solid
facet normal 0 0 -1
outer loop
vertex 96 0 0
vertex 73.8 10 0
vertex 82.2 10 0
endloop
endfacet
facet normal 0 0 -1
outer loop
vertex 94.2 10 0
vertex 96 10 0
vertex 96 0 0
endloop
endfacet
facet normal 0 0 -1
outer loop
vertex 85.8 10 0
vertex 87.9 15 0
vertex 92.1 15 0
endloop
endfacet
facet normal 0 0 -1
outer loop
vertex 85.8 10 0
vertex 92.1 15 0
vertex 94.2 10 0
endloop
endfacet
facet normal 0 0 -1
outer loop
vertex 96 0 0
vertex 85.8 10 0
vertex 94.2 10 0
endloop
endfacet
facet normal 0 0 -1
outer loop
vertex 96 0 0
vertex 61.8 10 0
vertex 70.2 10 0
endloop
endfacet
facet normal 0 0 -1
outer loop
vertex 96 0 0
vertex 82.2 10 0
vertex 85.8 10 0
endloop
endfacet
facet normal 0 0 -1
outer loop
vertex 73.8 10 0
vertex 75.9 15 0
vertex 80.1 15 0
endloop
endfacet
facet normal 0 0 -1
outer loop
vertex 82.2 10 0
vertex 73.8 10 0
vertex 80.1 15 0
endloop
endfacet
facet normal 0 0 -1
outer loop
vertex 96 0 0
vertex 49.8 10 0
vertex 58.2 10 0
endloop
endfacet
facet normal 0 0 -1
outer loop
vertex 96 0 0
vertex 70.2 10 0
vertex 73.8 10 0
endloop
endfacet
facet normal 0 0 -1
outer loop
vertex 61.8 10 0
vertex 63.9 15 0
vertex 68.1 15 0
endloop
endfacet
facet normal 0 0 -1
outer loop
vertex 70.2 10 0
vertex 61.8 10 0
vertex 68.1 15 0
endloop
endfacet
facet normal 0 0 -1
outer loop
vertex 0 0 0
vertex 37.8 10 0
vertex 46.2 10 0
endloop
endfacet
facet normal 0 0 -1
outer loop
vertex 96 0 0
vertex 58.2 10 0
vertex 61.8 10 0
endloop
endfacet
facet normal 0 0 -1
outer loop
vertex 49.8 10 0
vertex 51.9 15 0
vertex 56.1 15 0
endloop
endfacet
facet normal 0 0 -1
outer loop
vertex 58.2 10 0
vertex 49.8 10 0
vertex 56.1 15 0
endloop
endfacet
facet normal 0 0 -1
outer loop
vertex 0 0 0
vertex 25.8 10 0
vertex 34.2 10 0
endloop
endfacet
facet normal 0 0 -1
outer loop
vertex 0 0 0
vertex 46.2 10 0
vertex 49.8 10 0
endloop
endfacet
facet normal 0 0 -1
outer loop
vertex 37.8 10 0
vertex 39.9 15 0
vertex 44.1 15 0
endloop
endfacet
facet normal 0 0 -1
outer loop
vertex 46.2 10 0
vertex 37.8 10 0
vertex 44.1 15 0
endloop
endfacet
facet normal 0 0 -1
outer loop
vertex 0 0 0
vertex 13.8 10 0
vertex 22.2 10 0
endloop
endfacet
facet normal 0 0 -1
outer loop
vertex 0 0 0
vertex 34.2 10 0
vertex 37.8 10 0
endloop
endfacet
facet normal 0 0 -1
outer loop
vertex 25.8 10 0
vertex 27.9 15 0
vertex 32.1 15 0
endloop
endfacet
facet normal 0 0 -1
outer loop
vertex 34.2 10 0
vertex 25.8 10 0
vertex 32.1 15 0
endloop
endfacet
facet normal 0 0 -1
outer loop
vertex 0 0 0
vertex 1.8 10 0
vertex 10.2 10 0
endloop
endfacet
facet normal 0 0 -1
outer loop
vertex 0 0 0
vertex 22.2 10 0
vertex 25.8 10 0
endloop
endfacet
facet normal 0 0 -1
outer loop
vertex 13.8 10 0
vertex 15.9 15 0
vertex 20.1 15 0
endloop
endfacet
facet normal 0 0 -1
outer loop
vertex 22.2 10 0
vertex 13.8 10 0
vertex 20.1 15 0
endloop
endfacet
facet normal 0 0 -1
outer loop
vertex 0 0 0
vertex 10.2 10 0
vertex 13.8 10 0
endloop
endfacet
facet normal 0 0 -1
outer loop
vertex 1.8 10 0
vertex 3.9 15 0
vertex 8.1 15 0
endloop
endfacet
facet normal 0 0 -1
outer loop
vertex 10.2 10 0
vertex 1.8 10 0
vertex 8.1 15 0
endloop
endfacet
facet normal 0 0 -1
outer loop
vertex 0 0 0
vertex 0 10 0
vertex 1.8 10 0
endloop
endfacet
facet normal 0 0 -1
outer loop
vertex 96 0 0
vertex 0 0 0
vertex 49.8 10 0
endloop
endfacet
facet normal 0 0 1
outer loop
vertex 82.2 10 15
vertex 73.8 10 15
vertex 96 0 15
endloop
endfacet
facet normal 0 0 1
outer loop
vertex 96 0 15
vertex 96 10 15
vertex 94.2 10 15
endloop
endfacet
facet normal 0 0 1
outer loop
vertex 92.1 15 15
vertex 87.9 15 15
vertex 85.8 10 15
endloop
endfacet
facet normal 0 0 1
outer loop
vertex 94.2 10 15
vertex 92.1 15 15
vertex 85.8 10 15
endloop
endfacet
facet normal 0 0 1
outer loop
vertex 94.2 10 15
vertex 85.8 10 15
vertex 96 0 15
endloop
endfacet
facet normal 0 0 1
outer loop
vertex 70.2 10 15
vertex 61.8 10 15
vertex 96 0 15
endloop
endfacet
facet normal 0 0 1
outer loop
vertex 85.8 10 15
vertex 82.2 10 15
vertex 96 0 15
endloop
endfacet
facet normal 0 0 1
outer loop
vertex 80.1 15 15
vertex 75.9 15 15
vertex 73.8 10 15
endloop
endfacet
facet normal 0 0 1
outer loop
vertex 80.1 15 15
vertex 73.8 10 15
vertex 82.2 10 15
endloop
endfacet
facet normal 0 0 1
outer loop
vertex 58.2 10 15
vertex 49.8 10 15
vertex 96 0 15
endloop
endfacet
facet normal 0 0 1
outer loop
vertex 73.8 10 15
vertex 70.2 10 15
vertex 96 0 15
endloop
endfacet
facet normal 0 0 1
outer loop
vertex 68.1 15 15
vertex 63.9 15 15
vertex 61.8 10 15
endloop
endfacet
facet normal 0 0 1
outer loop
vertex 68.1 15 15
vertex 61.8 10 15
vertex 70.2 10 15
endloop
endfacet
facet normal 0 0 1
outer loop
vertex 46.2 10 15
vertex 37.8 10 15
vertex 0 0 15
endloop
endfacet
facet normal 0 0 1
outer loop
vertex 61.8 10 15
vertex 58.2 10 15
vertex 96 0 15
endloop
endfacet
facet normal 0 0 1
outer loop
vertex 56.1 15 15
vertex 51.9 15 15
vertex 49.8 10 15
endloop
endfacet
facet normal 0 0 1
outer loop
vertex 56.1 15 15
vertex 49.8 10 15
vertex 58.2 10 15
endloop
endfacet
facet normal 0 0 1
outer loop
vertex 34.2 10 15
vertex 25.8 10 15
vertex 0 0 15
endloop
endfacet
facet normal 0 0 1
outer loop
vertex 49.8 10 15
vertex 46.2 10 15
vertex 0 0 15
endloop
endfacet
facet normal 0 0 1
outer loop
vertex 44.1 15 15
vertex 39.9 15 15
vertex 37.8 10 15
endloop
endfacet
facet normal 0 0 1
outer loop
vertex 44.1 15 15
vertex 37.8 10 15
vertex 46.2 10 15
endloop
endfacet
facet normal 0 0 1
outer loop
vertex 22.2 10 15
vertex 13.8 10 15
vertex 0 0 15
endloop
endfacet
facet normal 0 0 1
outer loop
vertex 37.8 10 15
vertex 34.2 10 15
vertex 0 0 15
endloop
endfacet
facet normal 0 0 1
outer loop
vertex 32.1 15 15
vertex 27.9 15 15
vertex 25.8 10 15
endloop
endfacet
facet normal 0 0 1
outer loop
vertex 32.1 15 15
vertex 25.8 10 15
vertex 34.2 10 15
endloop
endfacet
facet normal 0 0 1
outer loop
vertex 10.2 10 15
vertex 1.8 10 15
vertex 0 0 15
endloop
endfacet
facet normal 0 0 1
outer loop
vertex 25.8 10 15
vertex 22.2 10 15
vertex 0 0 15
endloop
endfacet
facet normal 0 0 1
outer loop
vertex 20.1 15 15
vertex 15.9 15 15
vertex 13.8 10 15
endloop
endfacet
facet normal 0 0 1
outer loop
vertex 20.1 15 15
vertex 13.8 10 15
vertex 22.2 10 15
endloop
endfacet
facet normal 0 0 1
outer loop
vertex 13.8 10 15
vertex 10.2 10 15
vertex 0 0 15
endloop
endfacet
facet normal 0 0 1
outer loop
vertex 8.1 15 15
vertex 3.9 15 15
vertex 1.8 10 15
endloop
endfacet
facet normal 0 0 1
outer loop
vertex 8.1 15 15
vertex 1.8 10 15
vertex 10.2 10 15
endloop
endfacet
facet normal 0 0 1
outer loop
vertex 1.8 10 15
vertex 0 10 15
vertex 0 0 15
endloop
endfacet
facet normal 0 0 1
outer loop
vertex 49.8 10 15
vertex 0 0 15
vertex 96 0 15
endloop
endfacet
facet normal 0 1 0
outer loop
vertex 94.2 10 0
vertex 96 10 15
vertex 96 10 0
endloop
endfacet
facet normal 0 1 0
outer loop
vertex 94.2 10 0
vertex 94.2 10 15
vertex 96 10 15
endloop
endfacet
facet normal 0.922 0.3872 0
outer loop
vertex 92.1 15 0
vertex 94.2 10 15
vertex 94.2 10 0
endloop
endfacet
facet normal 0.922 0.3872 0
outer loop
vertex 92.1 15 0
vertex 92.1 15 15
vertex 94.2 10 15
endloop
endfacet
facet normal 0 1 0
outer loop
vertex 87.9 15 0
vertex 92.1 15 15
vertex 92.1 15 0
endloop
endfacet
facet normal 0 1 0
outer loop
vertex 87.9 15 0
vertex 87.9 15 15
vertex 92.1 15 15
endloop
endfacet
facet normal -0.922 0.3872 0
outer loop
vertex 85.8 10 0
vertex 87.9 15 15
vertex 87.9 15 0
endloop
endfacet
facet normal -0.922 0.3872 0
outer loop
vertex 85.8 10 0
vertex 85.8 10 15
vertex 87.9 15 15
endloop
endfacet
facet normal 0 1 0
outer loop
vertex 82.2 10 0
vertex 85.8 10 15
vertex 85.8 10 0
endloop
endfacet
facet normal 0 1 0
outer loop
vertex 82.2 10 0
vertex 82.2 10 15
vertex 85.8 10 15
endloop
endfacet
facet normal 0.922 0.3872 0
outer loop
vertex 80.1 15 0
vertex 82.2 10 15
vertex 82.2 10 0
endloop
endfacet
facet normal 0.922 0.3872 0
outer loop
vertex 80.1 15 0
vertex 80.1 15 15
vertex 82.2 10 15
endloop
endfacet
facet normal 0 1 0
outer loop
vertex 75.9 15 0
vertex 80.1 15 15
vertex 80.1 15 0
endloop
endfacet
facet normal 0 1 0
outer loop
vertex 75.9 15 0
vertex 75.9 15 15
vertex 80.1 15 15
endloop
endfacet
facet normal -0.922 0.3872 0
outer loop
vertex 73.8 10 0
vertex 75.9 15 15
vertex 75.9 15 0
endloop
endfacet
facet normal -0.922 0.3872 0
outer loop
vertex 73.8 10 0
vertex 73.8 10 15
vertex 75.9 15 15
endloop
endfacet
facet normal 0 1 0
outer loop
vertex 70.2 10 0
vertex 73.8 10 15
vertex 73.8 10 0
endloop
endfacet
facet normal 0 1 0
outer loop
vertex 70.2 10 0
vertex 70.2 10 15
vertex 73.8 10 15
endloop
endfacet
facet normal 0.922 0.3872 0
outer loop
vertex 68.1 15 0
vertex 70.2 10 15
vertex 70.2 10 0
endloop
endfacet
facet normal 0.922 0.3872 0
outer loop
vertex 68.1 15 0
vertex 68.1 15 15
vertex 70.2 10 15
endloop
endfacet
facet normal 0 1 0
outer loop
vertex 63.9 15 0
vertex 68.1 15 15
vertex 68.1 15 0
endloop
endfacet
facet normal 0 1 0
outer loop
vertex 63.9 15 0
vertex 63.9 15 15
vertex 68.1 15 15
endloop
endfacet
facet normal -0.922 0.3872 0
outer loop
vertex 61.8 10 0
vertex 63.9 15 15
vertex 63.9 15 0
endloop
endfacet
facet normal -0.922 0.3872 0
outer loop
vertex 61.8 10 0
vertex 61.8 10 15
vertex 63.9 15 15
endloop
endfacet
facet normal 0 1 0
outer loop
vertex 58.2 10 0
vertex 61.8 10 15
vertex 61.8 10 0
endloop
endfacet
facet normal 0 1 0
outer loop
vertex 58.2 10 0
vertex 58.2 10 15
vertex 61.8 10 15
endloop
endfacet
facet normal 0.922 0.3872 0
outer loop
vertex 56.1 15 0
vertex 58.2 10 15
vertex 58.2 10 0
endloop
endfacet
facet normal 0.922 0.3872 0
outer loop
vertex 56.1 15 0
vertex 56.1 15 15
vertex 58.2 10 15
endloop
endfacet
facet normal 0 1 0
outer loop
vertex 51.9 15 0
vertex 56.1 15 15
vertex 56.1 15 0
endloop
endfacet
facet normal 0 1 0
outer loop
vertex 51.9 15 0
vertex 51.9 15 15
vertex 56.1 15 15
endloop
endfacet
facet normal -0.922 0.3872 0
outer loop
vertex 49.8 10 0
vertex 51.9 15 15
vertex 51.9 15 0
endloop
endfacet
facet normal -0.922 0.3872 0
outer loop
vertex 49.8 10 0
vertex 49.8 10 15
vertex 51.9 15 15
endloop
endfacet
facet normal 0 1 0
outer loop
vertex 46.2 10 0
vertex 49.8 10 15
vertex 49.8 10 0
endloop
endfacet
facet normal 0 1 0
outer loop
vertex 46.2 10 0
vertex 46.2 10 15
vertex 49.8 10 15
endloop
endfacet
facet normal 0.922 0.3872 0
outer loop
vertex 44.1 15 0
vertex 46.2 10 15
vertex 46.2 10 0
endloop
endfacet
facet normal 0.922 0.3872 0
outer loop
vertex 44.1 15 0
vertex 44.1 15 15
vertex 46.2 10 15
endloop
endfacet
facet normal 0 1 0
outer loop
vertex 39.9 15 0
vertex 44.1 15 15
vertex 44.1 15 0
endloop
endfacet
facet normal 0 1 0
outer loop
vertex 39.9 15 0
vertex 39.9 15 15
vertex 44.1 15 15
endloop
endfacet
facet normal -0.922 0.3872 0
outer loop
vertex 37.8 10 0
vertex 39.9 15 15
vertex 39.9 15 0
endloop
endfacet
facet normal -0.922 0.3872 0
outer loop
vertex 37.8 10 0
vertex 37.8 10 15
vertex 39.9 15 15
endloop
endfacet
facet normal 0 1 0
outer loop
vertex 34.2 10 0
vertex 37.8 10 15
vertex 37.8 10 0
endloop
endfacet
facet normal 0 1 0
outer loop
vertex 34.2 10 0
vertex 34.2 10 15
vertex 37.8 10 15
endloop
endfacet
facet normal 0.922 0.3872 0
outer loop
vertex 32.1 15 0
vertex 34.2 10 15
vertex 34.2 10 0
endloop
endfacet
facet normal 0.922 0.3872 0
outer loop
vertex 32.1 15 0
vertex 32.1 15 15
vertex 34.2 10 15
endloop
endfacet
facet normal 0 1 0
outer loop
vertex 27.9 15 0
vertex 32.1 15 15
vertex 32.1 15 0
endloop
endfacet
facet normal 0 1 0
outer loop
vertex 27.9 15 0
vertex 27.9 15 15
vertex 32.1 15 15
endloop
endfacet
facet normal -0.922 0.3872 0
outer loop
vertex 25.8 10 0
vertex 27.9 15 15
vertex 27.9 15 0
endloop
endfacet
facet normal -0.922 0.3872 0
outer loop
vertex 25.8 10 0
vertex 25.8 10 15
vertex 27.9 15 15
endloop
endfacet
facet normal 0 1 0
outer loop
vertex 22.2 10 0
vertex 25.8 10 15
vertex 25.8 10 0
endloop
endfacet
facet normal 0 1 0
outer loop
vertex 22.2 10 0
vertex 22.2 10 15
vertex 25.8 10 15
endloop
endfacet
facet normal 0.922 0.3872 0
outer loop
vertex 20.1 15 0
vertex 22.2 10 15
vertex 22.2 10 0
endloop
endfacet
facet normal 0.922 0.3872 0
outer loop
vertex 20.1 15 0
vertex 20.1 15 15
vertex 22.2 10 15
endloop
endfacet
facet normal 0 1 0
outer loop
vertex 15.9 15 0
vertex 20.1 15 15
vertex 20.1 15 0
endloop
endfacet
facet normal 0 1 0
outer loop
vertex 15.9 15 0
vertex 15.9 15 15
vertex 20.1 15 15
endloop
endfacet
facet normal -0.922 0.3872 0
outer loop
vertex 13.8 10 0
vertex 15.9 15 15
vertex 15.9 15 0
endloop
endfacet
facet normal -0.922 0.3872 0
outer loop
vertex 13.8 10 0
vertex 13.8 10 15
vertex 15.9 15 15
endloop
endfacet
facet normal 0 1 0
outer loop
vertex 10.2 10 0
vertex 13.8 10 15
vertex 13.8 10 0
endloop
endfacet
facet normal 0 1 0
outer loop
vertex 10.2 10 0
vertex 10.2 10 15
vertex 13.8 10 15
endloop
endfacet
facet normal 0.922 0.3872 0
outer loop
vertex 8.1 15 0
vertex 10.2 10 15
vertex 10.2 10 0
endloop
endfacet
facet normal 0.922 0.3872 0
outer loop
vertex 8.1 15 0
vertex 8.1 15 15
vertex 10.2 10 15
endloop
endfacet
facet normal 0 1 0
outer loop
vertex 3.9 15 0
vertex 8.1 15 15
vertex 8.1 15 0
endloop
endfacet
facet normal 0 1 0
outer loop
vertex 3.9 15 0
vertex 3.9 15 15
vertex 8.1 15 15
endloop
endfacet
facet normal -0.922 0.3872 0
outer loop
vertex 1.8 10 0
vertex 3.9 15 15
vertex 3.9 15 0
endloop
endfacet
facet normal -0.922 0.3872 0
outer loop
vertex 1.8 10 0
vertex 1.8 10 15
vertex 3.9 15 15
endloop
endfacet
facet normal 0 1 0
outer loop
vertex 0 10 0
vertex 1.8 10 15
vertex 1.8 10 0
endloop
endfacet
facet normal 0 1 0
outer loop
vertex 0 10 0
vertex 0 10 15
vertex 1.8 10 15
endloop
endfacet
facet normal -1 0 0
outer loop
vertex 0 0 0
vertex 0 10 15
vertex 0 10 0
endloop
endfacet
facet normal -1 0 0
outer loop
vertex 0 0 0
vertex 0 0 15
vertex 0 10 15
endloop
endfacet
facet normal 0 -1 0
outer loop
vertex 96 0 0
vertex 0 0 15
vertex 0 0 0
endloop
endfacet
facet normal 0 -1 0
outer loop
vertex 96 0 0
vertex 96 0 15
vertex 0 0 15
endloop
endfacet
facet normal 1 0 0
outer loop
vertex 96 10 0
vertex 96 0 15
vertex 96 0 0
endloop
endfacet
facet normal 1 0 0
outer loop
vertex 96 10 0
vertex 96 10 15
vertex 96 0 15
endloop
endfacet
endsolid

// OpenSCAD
$fn = 32;

// ----------------------------------------------------------------------
// Gear rack: 8 teeth, pitch 12 mm
// ----------------------------------------------------------------------

// --- parameters (mm) ---
teeth = 8;                // number of teeth
pitch = 12;               // tooth pitch, X
root_w = 8.4;             // tooth width at the root
tip_w = 4.2;              // tooth width at the tip
base_h = 10;              // rack body height, Y
tooth_h = 5;              // tooth height above the body
plate_t = 15;             // rack width, Z (extrusion height)

rack_l = teeth * pitch;  // overall length
total_h = base_h + tooth_h;  // overall height

profile = [[0, 0], [96, 0], [96, 10], [94.2, 10], [92.1, 15], [87.9, 15], [85.8, 10], [82.2, 10], [80.1, 15], [75.9, 15], [73.8, 10], [70.2, 10], [68.1, 15], [63.9, 15], [61.8, 10], [58.2, 10], [56.1, 15], [51.9, 15], [49.8, 10], [46.2, 10], [44.1, 15], [39.9, 15], [37.8, 10], [34.2, 10], [32.1, 15], [27.9, 15], [25.8, 10], [22.2, 10], [20.1, 15], [15.9, 15], [13.8, 10], [10.2, 10], [8.1, 15], [3.9, 15], [1.8, 10], [0, 10]];  // primary outline, 36 points, counter clockwise

// --- the one profile operation ---
linear_extrude(height = plate_t) polygon(points = profile);
